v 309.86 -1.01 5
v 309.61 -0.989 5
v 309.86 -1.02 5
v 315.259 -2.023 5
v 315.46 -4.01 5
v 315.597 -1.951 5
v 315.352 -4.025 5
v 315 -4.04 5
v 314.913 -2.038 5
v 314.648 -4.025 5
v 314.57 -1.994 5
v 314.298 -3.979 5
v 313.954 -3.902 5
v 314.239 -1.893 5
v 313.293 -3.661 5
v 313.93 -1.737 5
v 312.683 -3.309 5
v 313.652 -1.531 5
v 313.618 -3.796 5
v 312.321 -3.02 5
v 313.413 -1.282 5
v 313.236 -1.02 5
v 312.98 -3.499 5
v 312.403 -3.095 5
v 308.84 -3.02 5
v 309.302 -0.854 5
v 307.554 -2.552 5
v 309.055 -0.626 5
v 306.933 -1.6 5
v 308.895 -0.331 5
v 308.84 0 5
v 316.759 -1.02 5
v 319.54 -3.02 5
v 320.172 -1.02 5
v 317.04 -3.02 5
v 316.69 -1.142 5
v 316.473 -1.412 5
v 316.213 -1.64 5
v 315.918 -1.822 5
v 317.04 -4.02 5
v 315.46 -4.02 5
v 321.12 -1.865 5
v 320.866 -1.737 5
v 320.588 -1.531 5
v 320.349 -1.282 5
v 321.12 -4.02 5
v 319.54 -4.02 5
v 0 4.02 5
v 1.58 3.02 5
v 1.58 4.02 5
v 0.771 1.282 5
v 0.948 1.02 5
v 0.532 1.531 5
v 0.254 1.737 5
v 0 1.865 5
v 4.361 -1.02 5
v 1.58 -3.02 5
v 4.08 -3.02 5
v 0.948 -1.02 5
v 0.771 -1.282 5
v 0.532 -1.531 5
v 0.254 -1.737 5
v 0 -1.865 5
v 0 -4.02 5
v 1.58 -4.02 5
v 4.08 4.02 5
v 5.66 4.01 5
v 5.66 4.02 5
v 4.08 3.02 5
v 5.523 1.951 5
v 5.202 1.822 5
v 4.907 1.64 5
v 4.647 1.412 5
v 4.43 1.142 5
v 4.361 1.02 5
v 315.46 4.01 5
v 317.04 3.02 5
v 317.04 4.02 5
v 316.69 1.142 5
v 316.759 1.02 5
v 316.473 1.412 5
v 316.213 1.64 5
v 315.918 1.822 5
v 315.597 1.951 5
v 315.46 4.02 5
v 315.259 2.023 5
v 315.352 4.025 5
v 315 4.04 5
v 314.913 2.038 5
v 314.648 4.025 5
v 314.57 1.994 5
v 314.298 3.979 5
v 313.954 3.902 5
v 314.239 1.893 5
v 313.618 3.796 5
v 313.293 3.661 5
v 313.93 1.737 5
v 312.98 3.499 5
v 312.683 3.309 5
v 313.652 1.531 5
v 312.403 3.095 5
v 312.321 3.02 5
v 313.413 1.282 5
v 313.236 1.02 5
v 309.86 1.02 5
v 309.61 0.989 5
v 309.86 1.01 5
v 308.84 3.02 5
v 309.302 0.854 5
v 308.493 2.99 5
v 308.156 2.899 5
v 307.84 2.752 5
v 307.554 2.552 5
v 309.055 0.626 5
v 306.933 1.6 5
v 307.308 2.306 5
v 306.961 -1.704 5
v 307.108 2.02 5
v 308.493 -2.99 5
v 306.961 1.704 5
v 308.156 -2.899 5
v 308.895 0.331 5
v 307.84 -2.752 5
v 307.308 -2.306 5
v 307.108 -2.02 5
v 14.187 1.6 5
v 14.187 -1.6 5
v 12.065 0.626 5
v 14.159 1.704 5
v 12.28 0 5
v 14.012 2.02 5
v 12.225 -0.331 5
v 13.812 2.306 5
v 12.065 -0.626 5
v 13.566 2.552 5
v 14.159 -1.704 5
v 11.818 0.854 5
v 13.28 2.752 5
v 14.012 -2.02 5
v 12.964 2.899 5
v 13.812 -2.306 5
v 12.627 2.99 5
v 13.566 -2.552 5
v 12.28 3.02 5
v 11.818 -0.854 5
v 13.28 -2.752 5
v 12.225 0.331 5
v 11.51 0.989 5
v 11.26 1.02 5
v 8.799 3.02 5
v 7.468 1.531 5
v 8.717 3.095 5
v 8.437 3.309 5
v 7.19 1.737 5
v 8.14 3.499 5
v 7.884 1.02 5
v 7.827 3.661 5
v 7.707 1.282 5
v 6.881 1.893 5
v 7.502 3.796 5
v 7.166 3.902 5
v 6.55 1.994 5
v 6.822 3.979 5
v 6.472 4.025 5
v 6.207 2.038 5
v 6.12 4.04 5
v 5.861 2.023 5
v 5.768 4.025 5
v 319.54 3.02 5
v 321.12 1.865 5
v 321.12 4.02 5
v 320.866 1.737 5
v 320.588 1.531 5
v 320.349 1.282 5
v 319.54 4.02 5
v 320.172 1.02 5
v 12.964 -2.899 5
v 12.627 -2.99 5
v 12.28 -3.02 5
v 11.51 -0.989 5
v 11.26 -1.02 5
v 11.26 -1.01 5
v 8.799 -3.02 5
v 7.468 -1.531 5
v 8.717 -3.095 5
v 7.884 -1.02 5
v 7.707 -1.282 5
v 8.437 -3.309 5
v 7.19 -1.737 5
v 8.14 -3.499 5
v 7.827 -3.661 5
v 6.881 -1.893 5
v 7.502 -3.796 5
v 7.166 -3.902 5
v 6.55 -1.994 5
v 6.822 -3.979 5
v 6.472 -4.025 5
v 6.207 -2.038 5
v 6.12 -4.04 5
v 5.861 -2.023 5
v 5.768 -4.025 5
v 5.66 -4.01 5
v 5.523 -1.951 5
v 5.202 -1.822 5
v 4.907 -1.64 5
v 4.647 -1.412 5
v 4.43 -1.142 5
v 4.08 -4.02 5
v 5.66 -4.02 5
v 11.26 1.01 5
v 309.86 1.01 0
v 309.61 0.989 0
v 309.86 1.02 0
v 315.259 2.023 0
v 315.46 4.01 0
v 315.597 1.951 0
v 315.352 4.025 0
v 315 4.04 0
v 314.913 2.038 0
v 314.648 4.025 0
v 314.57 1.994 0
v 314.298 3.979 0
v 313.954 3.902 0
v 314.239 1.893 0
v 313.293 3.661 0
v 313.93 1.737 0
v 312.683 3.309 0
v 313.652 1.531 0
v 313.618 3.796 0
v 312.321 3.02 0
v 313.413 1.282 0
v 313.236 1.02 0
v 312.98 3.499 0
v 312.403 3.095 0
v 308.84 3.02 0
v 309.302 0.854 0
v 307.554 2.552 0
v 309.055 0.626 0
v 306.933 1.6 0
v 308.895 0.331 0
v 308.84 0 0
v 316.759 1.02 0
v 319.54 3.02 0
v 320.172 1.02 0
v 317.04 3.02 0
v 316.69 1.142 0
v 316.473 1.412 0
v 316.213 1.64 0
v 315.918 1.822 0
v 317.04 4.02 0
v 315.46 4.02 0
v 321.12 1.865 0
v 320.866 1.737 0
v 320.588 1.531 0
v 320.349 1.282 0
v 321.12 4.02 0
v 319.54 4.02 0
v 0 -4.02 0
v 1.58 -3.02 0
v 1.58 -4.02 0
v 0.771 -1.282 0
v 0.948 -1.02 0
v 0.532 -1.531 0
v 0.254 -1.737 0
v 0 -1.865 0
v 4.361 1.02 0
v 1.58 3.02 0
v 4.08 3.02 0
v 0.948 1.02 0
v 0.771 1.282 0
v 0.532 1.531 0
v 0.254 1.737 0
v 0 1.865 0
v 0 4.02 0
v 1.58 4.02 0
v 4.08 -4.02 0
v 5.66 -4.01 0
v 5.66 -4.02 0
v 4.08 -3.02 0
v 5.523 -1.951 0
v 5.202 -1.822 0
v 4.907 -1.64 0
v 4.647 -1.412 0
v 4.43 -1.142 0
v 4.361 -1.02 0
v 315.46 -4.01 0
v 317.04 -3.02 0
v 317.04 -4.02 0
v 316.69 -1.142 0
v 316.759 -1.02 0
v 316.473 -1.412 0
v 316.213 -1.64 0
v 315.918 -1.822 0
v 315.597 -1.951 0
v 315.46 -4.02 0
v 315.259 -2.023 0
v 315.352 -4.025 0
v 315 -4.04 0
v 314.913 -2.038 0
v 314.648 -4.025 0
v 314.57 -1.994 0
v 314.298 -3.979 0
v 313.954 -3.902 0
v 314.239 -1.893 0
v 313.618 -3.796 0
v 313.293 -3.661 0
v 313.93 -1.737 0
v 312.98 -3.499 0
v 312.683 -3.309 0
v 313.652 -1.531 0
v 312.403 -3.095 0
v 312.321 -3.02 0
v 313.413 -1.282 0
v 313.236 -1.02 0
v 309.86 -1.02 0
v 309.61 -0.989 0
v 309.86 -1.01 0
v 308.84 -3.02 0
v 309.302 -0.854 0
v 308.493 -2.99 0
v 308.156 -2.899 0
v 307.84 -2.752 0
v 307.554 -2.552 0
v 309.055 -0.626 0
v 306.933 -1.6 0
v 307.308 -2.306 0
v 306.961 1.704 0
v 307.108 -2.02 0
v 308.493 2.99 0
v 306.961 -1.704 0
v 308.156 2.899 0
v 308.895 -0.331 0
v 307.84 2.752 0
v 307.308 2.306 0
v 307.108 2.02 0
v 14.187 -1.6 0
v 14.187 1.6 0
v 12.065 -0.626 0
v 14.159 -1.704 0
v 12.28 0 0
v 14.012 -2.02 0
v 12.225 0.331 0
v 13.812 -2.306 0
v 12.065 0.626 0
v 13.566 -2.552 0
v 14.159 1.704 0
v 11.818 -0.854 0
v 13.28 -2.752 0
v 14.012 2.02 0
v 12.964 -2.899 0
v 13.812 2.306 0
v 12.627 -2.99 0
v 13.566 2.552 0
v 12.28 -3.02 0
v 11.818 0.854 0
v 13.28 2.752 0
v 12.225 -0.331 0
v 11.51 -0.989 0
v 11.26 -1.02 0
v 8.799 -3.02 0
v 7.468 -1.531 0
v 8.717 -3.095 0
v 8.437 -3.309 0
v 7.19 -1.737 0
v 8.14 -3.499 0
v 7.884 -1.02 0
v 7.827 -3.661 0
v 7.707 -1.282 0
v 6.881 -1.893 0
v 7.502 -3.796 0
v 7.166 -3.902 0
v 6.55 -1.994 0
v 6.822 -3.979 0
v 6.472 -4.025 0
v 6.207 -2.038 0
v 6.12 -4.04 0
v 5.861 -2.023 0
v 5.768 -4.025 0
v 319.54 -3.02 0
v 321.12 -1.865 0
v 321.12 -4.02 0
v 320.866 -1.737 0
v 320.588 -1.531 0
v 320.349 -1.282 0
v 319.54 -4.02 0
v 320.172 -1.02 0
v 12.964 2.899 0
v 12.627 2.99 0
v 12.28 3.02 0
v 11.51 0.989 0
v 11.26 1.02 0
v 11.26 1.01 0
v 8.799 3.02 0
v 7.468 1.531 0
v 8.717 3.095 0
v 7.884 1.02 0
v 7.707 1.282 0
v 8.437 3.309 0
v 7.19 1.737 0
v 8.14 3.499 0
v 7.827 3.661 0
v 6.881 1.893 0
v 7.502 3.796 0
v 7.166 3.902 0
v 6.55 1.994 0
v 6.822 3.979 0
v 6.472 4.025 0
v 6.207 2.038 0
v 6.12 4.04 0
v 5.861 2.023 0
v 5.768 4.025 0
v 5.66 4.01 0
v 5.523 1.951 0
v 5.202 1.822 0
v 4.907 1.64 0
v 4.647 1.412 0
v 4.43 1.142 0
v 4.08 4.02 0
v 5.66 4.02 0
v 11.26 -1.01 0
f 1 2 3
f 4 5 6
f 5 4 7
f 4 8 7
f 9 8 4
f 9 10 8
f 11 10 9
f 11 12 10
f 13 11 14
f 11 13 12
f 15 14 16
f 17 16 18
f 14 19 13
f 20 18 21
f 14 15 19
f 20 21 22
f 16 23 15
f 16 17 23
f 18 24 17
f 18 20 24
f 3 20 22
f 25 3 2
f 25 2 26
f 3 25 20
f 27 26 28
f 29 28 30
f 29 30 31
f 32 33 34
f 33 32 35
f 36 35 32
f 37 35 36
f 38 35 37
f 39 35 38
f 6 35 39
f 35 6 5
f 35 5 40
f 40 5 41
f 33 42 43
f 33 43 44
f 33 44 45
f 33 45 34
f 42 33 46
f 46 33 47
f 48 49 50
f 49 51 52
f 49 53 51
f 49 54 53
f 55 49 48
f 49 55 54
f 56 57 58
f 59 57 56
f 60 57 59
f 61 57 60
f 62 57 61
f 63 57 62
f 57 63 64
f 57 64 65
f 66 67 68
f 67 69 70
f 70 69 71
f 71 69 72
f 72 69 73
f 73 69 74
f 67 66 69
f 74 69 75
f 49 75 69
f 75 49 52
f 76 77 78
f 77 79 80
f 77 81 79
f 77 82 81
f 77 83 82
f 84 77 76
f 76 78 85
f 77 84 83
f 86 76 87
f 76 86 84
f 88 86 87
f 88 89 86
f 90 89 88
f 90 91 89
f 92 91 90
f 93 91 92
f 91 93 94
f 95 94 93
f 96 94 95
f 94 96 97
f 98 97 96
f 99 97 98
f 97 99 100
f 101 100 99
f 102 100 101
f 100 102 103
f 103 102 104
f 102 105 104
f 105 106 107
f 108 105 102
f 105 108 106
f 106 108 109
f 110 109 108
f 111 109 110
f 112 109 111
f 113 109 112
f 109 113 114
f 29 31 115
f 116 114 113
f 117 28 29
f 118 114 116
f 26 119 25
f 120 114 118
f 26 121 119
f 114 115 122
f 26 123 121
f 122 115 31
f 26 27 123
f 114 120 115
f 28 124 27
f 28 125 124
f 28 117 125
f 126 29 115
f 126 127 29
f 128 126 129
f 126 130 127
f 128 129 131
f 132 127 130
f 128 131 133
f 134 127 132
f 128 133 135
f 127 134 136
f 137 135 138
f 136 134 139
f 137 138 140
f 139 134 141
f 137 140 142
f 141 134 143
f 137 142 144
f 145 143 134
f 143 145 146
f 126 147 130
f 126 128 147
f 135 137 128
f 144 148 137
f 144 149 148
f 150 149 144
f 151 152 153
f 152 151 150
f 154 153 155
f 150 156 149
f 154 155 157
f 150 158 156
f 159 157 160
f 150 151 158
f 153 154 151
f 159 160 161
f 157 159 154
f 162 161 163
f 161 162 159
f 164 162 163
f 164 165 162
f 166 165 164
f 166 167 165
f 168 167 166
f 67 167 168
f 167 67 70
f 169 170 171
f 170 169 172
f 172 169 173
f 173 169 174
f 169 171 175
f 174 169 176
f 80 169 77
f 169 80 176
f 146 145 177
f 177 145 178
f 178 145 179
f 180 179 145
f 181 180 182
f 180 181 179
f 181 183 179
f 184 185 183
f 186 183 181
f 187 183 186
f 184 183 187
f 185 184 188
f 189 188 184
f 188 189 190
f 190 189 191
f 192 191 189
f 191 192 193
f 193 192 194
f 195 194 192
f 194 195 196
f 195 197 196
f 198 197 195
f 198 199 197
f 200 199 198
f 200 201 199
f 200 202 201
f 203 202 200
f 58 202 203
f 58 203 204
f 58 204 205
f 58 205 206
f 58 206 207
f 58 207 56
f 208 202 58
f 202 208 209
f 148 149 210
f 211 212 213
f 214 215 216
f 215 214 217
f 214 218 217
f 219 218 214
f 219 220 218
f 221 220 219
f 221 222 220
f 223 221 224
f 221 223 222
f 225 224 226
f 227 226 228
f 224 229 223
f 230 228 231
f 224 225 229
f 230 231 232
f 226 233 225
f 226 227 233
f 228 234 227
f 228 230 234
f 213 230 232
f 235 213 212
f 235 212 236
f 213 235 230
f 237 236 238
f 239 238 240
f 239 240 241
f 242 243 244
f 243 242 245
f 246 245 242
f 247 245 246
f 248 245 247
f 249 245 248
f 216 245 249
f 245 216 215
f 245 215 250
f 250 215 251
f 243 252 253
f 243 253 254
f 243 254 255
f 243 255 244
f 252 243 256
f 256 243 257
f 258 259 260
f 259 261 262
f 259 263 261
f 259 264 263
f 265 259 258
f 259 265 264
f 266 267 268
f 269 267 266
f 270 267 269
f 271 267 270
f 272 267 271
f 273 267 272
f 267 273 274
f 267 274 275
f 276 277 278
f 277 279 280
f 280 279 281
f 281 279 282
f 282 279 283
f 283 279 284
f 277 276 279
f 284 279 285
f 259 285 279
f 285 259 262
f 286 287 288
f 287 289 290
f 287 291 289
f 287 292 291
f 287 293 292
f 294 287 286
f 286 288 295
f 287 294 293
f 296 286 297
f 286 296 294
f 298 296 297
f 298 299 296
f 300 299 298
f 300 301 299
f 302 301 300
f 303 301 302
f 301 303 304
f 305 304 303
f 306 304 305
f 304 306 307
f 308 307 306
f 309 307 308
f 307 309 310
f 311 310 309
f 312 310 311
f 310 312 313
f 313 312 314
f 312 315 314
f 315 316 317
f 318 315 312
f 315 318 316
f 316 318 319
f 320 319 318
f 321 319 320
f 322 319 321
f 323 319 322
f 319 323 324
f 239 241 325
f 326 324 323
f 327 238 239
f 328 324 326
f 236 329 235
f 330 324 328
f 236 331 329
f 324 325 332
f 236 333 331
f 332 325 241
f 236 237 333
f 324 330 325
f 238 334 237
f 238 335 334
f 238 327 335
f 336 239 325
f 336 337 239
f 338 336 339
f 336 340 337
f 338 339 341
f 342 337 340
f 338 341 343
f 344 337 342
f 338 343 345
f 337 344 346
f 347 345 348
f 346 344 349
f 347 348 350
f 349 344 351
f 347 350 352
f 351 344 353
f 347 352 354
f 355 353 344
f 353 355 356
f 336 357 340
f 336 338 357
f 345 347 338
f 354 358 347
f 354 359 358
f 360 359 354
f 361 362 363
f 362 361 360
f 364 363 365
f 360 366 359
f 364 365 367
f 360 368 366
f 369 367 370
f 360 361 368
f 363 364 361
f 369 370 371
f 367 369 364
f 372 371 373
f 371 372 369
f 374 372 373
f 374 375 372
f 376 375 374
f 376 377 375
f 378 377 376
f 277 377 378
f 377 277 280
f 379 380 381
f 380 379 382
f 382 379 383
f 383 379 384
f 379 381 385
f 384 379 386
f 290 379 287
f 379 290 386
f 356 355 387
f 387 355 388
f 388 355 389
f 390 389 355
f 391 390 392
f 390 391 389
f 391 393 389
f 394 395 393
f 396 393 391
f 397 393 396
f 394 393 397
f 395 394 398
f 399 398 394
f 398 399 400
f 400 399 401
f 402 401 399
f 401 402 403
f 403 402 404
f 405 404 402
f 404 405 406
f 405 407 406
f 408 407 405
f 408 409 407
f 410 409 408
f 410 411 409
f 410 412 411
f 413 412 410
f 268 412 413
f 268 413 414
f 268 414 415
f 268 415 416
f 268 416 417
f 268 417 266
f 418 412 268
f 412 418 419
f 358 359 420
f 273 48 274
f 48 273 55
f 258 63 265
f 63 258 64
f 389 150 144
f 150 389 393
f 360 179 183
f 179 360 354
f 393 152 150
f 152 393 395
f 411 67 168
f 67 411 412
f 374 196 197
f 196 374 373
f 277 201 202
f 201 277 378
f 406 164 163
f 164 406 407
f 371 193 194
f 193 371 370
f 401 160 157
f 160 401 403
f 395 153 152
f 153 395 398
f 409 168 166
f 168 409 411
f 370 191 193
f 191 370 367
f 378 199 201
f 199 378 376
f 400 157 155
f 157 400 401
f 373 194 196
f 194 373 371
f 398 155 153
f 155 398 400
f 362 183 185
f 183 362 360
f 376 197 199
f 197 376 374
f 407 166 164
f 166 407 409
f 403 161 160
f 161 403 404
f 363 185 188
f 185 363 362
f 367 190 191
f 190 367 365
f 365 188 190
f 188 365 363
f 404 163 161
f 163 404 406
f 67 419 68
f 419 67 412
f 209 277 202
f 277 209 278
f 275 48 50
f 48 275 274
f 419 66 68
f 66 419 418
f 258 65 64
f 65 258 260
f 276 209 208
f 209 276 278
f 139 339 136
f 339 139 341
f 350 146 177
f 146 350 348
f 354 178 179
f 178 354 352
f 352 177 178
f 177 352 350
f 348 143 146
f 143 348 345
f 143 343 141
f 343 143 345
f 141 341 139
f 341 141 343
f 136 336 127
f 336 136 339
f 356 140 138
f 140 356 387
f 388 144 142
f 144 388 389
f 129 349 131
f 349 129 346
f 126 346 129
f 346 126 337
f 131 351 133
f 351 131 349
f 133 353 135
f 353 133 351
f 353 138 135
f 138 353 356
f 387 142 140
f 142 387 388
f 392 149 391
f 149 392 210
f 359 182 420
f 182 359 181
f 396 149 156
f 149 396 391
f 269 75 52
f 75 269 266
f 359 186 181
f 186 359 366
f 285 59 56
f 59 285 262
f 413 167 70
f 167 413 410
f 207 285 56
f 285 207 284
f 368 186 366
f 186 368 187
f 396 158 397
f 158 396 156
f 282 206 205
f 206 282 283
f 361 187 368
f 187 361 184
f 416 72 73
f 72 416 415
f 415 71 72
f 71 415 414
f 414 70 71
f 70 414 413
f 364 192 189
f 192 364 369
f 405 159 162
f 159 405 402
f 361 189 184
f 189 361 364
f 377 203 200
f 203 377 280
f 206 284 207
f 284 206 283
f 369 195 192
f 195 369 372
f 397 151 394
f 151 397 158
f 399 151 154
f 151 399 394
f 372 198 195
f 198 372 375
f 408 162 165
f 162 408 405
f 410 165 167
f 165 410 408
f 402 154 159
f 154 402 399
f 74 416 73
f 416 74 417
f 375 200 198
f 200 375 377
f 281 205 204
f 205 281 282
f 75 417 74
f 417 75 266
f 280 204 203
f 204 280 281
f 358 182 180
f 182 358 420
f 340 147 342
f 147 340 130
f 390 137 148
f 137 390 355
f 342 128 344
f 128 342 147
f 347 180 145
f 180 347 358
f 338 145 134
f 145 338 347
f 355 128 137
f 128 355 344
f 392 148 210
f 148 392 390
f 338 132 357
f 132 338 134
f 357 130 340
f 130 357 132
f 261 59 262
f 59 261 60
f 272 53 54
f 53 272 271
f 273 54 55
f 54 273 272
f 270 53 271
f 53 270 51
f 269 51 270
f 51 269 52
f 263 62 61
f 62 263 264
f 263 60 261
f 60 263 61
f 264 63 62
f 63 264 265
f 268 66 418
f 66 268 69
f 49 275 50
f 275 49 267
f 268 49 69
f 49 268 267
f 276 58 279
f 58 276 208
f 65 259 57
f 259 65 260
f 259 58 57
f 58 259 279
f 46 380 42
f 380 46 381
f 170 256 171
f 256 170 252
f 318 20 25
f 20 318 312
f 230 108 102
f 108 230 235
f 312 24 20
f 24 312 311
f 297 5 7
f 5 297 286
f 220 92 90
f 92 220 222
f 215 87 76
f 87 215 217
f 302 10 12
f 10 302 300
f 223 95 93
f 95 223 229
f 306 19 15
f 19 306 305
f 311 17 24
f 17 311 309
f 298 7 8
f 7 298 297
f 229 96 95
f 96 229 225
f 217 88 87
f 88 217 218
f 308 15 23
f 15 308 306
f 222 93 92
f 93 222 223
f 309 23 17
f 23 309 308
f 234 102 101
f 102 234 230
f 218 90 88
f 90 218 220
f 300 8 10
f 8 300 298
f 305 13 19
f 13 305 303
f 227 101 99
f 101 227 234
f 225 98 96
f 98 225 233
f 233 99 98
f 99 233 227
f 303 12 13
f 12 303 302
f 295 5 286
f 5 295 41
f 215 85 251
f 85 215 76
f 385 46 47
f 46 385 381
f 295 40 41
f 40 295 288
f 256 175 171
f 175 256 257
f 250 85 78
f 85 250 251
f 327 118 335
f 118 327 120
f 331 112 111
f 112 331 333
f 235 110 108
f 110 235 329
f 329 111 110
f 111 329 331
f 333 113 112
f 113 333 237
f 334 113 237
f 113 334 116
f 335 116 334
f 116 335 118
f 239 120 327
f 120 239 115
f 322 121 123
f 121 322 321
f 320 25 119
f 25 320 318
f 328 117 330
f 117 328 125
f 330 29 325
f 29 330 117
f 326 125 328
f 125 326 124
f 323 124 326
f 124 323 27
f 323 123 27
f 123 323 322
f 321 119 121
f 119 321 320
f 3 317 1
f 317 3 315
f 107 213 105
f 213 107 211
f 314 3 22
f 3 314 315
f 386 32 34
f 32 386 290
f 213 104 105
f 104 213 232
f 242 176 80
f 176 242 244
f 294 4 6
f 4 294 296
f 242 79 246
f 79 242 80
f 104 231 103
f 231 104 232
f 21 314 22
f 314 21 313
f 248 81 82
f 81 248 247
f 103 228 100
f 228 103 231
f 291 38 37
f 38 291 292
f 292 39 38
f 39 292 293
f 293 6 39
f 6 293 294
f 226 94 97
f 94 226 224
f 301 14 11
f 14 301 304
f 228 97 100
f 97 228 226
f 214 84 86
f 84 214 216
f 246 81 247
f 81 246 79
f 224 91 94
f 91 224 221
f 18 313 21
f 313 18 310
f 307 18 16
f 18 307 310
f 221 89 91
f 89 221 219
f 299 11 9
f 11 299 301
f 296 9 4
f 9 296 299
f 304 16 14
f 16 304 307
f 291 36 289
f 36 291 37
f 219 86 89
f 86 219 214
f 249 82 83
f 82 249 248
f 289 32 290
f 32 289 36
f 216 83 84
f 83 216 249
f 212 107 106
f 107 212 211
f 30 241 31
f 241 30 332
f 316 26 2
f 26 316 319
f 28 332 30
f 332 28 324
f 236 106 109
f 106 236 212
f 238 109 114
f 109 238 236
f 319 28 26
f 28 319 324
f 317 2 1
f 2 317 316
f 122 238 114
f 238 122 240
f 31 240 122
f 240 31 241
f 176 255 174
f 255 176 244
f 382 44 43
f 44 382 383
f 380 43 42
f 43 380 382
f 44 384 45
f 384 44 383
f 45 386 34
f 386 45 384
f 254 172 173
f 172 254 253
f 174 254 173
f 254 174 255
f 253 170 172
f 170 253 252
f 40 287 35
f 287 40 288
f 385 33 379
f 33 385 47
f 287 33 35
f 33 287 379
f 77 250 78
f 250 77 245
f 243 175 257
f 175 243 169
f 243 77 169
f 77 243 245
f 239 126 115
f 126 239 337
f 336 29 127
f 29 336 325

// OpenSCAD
$fa = 5;
$fs = 0.35;
tol=0.05;

wired = 3.58 + 0.5;  // wire diameter plus some tolerance
wall = 2;	     // part thickness
// spread = 21.46;  // real ladder line
spread = 12 * 25.4;  // distance between the wire centers
height = 5;	   
spreadratio = ((spread/25.4)/(10*wall)); // semi-arbitrary ratio for trying to firm up the body based on length and wall variables
gapratio = 0.5;     // gap in terms of wire diameter
tip = wired*1.5;    // distance between wire edge and part edge

// zip tie dimensions
zipd = 1;
zipw = 2.5;
//zipoff = zipw/2;           // minimum recommended lip width
//zipoff = (wall+zipw/2)/2;  // compromise
zipoff = tip-zipw-wired/2;   // at the edge of the wire

gap=gapratio * wired;
len = spread + tip*2 + wired;
tiplen = tip*2+wired/2;
tipinside = tiplen-wall-wired/4;
tipoutside = gap/2+wall;
h2 = height + tol*2;


translate([tiplen-spreadratio,-wall/2-spreadratio,0]) cube([spread-tip*2+(2*spreadratio),wall+2*spreadratio,height]);  // spreader body
translate([0,0,0]) holder();
translate([len,0,0]) rotate([0,0,180]) holder();

module holder() 
{
  difference() {
    union() {
      // tip outside
      translate([0,-tipoutside,0]) cube([tiplen,tipoutside*2,height]);
      // wire hole outside walls
      translate([tip,0,0]) cylinder(r=wired/2+wall, h=height);
      // a little thicker to fit the zip ties at the tips
      translate([0,-tipoutside-zipd,0]) cube([zipoff*2+zipw,(tipoutside+zipd)*2,height]);
    }
    // tip insides
    translate([-tol,-gap/2,-tol]) cube([tipinside+tol,gap,h2]);
    // wire hole inside
    translate([tip,0,-tol]) cylinder(r=wired/2, h=h2);
    // rounded gap end
    translate([tipinside,0,-tol]) cylinder(r=gap/2, h=h2);
    // guide to help the wire in
    translate([-wired/5,0,-tol]) cylinder(r=wired/2, h=h2);
    //  translate([len-tipinside,0,-tol]) cylinder(r=gap/2, h=h2);
    // round the tip inside corners
    corner(tiplen,-(gap/2+wall),90,wall);
    corner(tiplen,gap/2+wall,180,wall);
    // slots for zip tie
    translate([zipoff,tipoutside,-tol]) cube([zipw,zipd+tol,h2]);
    translate([zipoff,-tipoutside-zipd-tol,-tol]) cube([zipw,zipd+tol,h2]);
  }
}

module corner(x,y,rot,corner)
{
  translate([x,y,0]) rotate([0,0,rot])
  difference() {
    translate([-tol, -tol, -tol*2]) 
      cube([corner+tol, corner+tol, height+tol*4]);
    translate([corner,corner,-tol*2])
      cylinder(r=corner, h=height+tol*4);
  }
}
